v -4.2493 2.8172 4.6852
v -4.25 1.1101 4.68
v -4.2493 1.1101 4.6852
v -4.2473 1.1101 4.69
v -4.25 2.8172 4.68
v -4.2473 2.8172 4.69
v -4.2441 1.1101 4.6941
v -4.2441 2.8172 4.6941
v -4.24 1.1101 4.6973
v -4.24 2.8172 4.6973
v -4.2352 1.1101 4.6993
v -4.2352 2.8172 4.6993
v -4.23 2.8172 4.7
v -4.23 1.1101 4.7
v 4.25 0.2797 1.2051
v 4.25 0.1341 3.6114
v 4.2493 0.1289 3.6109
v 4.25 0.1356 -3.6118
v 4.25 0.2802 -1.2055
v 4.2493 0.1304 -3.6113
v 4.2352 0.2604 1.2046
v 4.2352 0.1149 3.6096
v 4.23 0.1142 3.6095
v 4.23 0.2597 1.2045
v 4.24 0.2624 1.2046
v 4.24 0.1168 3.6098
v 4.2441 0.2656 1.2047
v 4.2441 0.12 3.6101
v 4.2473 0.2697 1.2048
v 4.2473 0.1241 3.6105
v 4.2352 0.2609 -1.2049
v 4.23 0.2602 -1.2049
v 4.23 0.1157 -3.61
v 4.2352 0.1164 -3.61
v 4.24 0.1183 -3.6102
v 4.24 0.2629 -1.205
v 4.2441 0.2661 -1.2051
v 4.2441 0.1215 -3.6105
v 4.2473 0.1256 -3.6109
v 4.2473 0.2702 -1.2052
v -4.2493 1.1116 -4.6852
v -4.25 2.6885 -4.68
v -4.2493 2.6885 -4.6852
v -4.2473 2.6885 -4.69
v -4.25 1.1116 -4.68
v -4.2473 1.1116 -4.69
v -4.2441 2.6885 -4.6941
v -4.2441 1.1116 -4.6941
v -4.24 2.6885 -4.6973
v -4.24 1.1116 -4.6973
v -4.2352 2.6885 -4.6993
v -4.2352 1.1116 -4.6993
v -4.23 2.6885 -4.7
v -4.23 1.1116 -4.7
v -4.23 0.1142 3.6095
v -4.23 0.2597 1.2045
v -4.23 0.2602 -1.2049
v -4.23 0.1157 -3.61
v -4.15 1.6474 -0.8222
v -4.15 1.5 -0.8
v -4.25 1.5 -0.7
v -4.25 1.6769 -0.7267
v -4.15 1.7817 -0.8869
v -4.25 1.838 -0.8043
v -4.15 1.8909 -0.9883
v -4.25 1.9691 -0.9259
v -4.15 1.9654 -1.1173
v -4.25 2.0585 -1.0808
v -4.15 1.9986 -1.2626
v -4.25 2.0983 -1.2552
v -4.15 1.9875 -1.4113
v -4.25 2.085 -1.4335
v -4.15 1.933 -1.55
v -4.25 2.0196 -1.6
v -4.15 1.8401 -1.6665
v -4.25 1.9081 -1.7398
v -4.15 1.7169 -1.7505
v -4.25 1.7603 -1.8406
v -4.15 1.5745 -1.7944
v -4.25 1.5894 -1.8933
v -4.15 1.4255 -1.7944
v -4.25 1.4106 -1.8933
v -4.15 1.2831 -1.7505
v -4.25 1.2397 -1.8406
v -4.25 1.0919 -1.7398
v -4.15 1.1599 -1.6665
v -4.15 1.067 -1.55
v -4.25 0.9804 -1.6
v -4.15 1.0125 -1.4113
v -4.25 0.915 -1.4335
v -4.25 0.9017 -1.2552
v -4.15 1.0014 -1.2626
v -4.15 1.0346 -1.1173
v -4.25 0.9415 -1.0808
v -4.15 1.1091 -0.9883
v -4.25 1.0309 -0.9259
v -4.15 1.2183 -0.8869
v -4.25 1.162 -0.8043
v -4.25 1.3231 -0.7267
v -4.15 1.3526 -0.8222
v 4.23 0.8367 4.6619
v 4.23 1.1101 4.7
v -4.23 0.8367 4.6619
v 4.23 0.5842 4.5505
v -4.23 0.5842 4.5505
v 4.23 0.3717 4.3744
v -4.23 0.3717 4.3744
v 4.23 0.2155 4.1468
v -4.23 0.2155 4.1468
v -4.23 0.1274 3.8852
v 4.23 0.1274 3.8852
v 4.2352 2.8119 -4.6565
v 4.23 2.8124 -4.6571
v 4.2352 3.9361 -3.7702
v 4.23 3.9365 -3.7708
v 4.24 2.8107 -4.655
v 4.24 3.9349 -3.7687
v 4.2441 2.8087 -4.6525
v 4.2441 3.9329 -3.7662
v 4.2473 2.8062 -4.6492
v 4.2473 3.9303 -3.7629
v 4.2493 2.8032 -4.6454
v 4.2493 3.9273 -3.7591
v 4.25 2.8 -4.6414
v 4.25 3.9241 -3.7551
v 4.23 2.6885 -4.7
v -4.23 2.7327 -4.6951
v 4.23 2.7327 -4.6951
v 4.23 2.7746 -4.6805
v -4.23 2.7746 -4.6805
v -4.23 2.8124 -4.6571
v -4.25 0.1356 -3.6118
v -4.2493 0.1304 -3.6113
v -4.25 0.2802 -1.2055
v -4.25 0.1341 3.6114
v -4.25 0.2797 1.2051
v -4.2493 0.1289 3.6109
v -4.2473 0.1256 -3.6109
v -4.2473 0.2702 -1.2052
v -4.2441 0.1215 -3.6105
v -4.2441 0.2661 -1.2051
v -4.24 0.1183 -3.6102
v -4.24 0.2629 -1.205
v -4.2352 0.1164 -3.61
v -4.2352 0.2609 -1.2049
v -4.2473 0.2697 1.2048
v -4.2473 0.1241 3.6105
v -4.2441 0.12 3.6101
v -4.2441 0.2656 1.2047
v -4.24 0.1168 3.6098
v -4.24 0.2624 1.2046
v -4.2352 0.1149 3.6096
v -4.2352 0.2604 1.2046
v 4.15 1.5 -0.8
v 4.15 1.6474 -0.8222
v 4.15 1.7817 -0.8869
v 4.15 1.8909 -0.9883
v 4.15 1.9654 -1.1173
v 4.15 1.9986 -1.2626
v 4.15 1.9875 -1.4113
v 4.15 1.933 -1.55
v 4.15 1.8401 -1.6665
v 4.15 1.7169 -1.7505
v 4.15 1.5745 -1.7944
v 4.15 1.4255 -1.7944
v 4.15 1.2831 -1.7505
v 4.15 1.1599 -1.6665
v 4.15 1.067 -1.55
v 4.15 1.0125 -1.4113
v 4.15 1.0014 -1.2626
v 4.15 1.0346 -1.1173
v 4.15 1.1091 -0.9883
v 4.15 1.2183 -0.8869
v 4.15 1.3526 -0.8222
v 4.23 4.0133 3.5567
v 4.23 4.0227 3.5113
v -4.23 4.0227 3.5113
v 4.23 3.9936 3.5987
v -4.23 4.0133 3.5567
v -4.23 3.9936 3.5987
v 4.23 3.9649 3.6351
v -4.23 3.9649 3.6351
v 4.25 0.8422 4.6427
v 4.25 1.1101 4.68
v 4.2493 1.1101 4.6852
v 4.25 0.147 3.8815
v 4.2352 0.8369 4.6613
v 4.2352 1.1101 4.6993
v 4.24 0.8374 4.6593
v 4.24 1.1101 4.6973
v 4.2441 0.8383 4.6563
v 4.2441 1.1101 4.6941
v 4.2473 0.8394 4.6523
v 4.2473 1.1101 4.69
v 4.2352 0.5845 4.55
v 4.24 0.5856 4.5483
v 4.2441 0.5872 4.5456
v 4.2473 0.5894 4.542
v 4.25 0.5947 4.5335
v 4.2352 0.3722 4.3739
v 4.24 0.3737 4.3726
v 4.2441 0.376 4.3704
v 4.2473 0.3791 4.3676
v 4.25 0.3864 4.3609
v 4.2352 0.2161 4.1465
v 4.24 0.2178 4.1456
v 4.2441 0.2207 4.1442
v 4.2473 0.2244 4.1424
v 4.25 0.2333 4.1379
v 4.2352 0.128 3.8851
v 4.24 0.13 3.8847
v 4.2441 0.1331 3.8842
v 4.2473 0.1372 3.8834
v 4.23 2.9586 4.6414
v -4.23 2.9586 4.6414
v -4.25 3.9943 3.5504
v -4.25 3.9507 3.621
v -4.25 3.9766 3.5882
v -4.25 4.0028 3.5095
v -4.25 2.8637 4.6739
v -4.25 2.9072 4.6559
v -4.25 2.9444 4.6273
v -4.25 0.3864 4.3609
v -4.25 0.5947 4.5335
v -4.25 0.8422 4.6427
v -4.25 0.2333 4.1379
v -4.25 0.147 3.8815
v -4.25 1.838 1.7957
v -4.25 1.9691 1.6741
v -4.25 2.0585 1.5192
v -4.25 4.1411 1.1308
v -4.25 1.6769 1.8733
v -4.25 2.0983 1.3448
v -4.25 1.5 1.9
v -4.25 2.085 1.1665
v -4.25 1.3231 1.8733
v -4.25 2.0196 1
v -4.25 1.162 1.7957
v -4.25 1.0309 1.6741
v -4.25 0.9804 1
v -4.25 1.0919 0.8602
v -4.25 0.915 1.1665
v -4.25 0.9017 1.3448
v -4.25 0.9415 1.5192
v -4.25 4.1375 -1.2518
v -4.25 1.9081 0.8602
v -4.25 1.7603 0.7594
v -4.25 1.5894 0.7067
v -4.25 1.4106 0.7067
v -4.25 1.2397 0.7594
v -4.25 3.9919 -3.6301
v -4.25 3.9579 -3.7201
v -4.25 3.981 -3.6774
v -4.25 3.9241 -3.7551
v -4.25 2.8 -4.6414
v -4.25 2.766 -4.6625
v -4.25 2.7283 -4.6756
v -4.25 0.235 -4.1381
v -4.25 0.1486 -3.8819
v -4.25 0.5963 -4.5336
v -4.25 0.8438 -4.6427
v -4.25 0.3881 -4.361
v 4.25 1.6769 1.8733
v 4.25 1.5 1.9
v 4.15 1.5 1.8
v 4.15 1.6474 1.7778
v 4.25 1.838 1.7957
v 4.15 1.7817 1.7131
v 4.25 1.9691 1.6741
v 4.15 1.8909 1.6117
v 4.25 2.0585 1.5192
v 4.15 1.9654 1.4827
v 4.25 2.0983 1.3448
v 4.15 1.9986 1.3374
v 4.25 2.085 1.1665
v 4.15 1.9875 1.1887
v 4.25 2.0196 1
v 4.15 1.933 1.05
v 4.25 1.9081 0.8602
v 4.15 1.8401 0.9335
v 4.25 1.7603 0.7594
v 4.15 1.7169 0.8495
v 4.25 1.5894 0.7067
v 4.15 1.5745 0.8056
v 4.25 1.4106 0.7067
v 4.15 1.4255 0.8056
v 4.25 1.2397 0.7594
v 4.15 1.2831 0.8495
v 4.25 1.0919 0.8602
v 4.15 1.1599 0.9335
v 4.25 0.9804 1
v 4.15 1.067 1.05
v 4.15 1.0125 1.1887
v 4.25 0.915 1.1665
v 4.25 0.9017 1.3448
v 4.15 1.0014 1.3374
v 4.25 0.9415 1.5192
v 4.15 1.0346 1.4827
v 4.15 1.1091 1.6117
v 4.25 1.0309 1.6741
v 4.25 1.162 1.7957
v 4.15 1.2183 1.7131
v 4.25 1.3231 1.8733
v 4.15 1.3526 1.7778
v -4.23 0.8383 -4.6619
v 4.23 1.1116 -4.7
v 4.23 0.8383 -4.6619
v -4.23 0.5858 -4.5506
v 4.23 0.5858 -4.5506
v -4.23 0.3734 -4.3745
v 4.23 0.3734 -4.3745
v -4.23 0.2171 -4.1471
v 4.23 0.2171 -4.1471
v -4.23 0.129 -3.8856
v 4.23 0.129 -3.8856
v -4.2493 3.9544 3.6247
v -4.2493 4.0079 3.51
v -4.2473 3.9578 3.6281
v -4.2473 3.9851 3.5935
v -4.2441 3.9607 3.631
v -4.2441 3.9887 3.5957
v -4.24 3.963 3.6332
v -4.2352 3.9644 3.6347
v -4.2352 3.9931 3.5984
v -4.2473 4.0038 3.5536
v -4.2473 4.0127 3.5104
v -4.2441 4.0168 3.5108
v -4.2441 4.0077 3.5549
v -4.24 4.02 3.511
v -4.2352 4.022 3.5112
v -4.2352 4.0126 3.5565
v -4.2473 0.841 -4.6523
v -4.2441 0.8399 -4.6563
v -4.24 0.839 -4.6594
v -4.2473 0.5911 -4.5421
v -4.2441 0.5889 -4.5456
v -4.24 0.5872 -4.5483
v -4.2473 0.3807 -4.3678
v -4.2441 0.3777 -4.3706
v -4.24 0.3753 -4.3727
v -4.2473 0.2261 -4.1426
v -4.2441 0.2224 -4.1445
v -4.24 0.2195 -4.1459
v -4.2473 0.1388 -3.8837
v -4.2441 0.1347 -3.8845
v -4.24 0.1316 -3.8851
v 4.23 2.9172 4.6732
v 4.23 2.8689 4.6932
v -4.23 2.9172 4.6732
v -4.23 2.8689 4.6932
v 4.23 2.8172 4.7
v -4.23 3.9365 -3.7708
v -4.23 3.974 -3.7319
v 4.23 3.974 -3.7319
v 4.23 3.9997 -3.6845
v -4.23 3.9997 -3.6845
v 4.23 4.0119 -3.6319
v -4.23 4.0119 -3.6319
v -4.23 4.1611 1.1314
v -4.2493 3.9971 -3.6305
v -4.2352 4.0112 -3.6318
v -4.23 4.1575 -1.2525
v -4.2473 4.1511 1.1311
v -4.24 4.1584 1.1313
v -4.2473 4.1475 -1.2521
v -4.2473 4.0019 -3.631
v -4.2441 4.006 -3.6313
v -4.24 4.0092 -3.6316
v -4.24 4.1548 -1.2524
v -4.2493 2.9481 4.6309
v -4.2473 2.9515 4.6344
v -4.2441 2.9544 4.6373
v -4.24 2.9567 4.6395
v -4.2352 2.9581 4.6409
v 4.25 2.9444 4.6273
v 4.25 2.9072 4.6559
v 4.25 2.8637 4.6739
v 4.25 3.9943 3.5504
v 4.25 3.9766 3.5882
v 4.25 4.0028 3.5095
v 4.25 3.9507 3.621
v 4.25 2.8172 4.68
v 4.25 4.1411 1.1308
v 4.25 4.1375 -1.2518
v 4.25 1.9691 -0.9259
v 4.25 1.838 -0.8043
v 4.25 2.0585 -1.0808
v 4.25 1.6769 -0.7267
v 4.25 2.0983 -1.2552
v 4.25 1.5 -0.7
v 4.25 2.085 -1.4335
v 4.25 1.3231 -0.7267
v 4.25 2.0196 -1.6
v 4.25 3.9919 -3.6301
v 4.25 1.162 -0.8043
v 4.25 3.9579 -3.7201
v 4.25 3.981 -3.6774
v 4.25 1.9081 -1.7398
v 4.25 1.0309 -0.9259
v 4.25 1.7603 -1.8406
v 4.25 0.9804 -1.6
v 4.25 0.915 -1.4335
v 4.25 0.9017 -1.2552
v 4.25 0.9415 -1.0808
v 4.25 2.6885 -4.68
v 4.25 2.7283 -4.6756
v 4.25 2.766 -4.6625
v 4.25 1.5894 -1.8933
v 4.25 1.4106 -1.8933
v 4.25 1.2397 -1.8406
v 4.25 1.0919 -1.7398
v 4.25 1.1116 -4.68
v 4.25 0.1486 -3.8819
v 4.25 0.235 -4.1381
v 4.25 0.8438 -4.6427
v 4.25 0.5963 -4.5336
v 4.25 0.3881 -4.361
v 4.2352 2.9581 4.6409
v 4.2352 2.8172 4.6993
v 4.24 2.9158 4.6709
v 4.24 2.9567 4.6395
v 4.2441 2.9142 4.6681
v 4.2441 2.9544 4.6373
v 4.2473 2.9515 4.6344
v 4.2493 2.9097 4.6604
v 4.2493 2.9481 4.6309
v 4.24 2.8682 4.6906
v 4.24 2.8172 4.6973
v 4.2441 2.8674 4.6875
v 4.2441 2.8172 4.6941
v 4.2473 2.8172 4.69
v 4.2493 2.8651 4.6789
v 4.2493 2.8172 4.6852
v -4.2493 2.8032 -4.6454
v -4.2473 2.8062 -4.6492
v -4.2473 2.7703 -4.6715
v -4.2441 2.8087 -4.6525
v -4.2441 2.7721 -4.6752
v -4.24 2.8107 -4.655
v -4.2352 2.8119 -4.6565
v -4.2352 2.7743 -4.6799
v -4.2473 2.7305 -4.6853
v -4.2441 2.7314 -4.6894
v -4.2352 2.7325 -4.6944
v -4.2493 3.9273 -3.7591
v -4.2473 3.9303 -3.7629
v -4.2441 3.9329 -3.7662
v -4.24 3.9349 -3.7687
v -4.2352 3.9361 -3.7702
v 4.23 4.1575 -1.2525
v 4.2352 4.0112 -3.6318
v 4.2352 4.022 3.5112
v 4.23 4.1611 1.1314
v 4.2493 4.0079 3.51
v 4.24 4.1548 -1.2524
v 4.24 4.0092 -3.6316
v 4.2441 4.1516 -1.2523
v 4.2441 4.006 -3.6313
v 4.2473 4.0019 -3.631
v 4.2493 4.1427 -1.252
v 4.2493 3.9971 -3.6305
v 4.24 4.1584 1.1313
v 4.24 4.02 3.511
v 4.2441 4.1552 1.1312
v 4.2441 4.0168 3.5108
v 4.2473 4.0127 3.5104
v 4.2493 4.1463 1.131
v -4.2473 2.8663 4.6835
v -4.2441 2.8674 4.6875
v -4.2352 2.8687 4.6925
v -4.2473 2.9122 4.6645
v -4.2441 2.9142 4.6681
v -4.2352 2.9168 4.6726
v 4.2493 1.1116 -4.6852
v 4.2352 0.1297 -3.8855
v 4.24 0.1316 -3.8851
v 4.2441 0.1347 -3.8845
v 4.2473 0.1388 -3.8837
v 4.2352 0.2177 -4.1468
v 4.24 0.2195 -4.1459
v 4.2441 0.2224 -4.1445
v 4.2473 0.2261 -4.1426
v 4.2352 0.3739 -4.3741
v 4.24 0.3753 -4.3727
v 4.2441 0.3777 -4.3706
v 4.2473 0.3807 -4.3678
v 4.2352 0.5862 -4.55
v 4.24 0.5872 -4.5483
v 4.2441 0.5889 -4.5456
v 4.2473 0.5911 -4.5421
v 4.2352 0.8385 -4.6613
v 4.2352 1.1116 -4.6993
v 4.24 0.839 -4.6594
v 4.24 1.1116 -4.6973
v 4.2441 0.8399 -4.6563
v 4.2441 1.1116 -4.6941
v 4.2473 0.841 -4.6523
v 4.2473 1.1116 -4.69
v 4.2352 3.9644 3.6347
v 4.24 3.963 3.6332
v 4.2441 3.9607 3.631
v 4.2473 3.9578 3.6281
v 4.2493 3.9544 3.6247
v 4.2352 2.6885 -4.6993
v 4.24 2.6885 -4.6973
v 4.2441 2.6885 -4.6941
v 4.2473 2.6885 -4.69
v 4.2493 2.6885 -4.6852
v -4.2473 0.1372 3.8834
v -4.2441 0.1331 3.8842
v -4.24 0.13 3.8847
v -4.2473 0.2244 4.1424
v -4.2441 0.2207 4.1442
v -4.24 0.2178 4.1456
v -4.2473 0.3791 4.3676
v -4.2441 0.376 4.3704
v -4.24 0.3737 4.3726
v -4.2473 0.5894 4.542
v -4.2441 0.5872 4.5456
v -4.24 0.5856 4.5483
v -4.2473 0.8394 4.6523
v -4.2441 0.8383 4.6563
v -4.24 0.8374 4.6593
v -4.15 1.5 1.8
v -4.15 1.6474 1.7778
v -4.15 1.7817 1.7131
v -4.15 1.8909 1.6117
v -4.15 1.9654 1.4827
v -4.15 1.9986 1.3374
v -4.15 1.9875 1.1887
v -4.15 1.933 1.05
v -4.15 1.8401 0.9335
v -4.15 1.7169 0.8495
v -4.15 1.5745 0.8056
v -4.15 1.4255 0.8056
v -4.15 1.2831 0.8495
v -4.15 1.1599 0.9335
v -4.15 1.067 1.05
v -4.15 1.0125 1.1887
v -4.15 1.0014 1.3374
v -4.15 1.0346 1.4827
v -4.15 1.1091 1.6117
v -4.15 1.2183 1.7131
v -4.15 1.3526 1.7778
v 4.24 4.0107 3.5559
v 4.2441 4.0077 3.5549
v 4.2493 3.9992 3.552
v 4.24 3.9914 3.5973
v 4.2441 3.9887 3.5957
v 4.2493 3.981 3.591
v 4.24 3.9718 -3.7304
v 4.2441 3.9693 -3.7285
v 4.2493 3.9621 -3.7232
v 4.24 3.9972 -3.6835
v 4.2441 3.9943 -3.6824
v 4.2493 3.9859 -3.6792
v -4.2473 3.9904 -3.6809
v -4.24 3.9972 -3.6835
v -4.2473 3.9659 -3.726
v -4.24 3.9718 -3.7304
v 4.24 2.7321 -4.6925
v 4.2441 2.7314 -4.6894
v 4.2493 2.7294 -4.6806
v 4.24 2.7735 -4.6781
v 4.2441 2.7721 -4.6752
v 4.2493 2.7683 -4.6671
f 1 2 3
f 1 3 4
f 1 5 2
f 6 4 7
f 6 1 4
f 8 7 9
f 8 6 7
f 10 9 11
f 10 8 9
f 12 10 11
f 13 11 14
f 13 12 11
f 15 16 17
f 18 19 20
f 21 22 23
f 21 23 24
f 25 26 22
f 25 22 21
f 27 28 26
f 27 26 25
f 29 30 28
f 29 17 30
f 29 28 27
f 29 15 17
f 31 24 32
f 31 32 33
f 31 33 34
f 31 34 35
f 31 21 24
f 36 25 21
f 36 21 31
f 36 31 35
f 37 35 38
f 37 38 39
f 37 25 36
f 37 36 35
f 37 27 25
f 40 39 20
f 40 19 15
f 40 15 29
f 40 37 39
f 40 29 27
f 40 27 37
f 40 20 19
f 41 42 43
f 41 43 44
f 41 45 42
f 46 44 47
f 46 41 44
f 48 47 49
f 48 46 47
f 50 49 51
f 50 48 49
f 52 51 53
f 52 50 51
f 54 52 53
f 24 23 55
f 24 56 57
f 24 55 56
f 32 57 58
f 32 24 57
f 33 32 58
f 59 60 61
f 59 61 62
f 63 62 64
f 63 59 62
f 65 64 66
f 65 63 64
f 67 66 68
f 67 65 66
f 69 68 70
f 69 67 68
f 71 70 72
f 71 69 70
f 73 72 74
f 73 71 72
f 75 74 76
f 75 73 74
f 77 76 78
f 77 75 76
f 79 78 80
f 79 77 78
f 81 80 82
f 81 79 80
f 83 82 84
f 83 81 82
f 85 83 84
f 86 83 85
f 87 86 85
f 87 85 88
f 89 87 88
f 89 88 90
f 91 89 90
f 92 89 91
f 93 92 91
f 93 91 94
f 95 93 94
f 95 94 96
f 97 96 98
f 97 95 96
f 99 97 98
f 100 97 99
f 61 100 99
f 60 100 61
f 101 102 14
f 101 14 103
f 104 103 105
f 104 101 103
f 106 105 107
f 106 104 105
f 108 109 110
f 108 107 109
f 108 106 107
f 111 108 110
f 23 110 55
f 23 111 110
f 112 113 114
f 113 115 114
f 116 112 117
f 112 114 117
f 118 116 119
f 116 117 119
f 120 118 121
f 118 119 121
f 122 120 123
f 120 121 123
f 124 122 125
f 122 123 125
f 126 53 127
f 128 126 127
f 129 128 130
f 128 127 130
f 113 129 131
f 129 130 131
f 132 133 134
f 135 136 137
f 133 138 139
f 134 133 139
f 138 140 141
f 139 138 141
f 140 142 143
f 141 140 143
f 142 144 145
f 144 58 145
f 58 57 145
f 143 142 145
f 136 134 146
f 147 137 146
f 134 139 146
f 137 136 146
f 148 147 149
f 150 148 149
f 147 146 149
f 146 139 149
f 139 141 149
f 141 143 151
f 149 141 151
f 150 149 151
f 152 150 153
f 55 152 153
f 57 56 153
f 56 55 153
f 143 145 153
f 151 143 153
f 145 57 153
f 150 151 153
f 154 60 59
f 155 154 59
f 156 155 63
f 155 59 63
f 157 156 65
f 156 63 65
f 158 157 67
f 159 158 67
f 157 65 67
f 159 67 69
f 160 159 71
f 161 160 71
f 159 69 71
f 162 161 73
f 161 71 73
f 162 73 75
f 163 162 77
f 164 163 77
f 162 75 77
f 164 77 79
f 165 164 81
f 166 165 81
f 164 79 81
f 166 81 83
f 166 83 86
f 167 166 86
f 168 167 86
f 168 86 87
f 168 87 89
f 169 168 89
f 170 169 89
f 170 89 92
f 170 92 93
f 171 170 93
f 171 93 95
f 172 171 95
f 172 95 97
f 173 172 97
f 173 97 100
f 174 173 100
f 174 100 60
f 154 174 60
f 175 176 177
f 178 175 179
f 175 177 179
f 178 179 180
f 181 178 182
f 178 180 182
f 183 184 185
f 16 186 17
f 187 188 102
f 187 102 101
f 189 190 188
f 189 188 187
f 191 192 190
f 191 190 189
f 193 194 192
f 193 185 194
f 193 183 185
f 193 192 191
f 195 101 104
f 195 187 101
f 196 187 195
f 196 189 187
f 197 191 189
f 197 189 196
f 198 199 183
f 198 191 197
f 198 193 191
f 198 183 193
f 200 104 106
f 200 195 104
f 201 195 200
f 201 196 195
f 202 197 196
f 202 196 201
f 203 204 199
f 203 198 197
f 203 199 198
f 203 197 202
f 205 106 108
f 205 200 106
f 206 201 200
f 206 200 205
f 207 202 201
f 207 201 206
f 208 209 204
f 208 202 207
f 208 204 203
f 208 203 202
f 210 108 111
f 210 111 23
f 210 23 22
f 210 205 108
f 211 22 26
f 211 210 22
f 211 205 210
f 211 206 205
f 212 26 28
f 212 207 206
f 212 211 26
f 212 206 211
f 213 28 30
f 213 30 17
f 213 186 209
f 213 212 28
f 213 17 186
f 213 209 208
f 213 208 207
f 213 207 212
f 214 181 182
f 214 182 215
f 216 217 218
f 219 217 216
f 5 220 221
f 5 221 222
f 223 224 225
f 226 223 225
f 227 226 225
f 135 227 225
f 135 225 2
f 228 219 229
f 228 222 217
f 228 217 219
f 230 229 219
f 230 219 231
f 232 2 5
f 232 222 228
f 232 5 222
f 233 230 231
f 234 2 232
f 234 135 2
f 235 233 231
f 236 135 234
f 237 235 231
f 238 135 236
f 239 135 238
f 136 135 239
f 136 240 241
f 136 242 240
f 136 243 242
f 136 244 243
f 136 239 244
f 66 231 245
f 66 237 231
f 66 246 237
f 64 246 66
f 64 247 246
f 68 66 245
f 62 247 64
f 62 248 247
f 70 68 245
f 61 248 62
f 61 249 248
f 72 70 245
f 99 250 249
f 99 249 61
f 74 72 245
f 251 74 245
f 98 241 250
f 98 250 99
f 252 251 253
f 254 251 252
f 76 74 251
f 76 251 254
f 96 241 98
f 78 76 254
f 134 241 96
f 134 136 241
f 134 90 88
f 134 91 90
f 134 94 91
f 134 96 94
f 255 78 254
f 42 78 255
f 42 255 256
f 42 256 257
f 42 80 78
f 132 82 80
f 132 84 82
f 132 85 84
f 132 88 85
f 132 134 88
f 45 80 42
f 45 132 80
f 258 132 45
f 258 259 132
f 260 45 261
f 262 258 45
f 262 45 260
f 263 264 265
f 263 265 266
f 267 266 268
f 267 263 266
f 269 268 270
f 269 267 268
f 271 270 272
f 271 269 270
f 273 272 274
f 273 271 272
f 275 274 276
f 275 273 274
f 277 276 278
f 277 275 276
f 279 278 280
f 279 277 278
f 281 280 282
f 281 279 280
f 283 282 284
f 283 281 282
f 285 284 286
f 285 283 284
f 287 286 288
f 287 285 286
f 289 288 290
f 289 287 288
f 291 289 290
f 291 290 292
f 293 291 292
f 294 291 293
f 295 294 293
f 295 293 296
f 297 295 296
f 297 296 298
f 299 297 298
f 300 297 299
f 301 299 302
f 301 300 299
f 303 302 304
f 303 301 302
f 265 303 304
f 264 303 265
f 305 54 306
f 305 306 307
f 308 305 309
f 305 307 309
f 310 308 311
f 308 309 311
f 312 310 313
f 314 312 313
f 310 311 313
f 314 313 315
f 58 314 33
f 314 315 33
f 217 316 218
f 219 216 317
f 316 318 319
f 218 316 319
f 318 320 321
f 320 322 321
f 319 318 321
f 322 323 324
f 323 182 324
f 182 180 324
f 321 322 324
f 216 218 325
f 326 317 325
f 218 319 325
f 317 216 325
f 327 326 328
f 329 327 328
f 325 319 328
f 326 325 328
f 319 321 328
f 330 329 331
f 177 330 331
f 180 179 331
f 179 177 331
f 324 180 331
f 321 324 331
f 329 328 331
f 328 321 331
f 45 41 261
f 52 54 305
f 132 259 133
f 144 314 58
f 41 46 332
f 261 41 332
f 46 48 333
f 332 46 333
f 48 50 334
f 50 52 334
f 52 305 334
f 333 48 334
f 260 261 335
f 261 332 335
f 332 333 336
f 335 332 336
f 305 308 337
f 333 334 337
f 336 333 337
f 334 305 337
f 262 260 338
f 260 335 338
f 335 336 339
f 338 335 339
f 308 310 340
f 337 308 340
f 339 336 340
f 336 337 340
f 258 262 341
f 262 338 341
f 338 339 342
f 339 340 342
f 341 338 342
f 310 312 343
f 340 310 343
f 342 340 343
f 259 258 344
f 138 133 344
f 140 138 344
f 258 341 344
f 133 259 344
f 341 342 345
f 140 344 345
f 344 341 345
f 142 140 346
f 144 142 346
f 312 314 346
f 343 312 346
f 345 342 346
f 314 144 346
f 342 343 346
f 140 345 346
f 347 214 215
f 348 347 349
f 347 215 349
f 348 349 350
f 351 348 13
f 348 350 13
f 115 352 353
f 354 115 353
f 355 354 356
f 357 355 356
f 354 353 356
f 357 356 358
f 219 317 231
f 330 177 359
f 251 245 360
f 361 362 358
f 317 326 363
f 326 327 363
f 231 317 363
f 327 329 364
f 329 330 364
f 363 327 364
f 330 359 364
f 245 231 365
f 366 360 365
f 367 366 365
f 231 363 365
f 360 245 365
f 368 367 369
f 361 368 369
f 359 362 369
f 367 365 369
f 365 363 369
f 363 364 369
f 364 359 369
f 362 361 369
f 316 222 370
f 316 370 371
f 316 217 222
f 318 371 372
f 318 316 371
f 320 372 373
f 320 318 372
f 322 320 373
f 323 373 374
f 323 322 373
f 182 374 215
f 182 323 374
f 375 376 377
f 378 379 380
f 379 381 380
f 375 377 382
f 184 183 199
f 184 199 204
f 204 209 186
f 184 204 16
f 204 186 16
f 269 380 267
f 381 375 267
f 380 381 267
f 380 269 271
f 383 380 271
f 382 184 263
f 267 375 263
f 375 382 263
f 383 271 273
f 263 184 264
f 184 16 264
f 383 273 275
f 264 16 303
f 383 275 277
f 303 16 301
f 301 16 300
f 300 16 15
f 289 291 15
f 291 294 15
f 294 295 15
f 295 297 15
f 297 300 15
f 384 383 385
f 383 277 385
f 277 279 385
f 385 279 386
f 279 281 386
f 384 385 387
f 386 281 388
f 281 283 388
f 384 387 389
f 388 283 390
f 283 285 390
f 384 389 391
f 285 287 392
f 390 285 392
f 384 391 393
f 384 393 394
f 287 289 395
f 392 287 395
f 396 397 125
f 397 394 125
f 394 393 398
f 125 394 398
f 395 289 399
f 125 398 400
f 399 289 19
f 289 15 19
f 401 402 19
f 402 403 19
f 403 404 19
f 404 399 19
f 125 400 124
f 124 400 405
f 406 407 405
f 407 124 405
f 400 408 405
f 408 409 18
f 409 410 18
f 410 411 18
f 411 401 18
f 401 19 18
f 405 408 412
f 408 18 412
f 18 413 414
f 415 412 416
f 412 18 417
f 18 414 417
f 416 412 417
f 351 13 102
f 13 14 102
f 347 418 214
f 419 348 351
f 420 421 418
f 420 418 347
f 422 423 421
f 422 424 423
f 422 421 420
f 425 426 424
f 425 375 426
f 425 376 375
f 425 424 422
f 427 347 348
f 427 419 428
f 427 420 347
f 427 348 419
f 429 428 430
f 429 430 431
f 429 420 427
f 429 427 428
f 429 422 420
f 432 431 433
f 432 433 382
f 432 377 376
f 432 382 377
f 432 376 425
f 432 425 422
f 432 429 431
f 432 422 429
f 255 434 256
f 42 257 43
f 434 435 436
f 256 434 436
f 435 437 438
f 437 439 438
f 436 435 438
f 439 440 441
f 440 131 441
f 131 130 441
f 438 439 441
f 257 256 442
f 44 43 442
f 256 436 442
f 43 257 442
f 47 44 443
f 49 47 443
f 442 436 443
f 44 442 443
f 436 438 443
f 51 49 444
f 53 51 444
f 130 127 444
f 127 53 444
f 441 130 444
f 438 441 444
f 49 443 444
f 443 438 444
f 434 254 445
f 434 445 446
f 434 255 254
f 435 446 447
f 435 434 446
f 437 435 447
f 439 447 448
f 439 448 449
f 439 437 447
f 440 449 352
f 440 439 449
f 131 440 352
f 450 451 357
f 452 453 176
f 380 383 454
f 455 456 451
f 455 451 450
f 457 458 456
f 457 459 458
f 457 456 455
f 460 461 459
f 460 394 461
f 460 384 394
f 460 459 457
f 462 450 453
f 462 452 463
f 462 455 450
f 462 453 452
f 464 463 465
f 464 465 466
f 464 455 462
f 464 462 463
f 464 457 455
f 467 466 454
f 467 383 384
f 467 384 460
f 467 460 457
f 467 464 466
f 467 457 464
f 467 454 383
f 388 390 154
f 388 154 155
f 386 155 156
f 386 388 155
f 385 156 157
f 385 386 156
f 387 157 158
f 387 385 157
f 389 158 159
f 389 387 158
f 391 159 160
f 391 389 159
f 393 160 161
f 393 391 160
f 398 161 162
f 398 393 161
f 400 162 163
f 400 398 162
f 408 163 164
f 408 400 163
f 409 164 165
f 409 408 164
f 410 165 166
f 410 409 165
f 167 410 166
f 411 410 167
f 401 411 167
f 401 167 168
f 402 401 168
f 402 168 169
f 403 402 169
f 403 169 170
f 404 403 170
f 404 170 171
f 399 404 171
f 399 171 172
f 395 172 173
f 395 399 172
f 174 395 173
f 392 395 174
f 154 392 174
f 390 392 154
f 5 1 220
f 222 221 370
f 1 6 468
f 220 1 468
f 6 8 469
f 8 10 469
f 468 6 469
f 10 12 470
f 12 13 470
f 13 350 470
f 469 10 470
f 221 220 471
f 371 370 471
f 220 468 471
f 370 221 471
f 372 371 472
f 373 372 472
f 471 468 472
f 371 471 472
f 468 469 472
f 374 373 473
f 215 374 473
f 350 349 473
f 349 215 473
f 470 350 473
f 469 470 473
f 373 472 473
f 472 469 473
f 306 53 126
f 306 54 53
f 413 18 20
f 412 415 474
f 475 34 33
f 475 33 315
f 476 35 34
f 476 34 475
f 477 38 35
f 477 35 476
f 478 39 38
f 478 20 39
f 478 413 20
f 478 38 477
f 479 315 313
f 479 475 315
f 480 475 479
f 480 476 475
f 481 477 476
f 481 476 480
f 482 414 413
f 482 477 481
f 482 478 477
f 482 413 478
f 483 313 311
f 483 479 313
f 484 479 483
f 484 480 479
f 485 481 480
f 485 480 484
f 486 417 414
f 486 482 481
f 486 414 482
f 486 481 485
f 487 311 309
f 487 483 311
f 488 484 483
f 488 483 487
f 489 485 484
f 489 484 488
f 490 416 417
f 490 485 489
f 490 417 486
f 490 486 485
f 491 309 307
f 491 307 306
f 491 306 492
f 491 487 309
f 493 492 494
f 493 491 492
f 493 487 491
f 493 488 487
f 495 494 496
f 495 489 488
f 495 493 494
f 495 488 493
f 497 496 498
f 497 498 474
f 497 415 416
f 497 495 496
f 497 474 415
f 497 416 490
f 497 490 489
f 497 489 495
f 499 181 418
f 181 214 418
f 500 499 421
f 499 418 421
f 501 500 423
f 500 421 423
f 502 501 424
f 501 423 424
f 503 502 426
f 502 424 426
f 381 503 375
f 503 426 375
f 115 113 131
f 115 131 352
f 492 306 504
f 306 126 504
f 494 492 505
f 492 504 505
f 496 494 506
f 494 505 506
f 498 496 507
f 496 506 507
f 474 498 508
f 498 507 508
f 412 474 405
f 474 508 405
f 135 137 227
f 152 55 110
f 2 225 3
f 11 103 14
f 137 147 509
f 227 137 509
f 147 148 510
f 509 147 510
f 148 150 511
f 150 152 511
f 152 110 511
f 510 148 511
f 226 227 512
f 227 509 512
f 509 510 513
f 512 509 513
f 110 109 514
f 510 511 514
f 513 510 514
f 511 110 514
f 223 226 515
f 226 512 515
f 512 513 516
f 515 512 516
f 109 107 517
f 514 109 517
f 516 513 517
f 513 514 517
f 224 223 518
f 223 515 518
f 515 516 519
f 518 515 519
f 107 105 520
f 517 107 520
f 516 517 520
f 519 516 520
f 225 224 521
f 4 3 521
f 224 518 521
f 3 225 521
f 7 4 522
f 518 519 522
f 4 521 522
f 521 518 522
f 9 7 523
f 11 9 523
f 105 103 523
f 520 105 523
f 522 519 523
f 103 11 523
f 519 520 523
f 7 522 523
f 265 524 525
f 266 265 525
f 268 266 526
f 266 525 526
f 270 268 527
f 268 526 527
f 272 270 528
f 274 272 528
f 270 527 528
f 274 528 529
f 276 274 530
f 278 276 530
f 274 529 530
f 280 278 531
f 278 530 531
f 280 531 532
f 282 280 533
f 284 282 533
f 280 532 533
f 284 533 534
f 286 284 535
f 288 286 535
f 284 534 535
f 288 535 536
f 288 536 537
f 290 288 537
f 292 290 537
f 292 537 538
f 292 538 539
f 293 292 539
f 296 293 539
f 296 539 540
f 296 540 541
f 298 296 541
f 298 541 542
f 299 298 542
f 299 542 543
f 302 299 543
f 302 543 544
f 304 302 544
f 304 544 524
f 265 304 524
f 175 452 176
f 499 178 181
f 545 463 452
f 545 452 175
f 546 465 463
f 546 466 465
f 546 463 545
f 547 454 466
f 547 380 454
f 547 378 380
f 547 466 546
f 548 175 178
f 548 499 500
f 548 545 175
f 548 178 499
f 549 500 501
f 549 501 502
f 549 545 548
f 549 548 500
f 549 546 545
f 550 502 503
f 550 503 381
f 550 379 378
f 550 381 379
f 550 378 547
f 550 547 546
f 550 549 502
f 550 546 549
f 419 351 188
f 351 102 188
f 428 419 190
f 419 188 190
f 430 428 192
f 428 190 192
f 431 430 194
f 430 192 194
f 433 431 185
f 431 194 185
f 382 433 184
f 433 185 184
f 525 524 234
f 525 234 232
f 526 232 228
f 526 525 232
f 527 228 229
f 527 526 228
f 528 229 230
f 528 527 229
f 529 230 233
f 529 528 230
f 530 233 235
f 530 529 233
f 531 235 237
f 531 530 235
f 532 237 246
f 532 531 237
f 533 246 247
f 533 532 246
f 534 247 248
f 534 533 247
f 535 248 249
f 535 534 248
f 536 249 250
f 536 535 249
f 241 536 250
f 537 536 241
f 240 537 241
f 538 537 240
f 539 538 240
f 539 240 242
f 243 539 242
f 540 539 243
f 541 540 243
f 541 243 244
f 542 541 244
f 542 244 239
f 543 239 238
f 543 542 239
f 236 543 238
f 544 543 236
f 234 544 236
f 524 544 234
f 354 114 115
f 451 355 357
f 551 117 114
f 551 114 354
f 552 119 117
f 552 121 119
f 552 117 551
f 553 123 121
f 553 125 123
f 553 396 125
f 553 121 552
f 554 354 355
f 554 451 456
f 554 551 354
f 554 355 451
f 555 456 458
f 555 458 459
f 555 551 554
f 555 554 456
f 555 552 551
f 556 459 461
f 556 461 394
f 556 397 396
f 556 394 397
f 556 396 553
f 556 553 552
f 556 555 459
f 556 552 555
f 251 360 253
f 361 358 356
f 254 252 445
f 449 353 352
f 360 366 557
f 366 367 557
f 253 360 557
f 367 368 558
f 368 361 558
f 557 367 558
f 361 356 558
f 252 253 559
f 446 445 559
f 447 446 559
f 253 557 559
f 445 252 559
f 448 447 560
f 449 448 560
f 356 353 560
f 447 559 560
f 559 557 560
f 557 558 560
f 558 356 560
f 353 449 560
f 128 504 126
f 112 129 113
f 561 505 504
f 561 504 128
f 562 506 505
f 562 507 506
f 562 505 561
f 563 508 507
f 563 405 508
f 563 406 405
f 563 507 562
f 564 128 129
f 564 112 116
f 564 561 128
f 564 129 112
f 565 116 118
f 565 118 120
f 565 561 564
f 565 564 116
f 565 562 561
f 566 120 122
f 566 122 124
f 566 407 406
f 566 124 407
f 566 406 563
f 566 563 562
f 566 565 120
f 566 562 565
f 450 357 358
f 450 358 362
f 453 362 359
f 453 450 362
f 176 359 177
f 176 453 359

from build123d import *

# Parameters (mm, degrees)
SKETCH1_W           = 8.5
SKETCH1_H           = 9.4
BOSS_EXTRUDE1_DEPTH = 4.2
CUT_EXTRUDE1_DEPTH  = 14.2
CHAMFER1_SIZE       = 1.142109378
CHAMFER1_SIZE_2     = 1
FILLET1_R           = 1
FILLET2_R           = 0.2
FILLET3_R           = 0.02
SKETCH3_R           = 0.5
CUT_EXTRUDE2_DEPTH  = 14.2
CHAMFER2_SIZE       = 0.1


with BuildPart() as part:
    # Sketch1 → Boss-Extrude1 (new body)
    with BuildSketch(Plane(origin=(0, 0, 0), x_dir=(1, 0, 0), z_dir=(0, 1, 0))):
        Rectangle(SKETCH1_W, SKETCH1_H)
    extrude(amount=BOSS_EXTRUDE1_DEPTH)

    # Sketch2 → Cut-Extrude1 (cut)
    with BuildSketch(Plane(origin=(4.25, 0, 0), x_dir=(0, 0, -1), z_dir=(1, 0, 0))):
        with BuildLine():
            Line((-4.7, 3.9), (-5.253535024, 5.241651662))
            Line((-5.253535024, 5.241651662), (3.889156526, 7.141243929))
            Line((3.889156526, 7.141243929), (5.679183493, 5.077233243))
            Line((5.679183493, 5.077233243), (4.7, 3.9))
            ThreePointArc((4.7, 3.9), (0, 4.177084699), (-4.7, 3.9))
        make_face()
        with BuildLine():
            Line((4.717394395, 0), (0, -2.904825783))
            Line((0, -2.904825783), (-4.70037365, 0))
            ThreePointArc((-4.70037365, 0), (0.008510373, 0.278136861), (4.717394395, 0))
        make_face()
    extrude(amount=-CUT_EXTRUDE1_DEPTH, mode=Mode.SUBTRACT)

    # Chamfer1
    # the kernel refuses this chamfer: 1.142109378, 1 mm, written as the material it takes off along each edge
    with BuildSketch(Plane(origin=(7.19581135, 3.9, -4.7), x_dir=(0, -1, 0), z_dir=(-1, 0, 0))) as chamfer1_piece_1:
        with BuildLine():
            Line((CHAMFER1_SIZE, 0), (-0.103952397, 0.982391987))
            ThreePointArc((-0.103952397, 0.982391987), (-0.056683865, 0.506732753), (0, 0))
            Line((0, 0), (CHAMFER1_SIZE, 0))
        make_face()
    extrude(amount=14.391622699, mode=Mode.SUBTRACT)
    with BuildSketch(Plane(origin=(7.145211131, 3.9, 4.7), x_dir=(0, 0.10355747110922714, -0.994623471559696), z_dir=(-1, 0, 0))) as chamfer1_piece_2:
        with BuildLine():
            Line((1.122251325, 0), (-CHAMFER1_SIZE_2 * 0.103557471109, CHAMFER1_SIZE_2 * 0.99462347156))
            Line((-CHAMFER1_SIZE_2 * 0.103557471109, CHAMFER1_SIZE_2 * 0.99462347156), (0, 0))
            ThreePointArc((0, 0), (0.578858696, -0.003932038), (1.122251325, 0))
        make_face()
    extrude(amount=14.290422262, mode=Mode.SUBTRACT)

    # Fillet1
    fillet1_edges = [part.edges().sort_by_distance(p)[0] for p in [
        (0, 0.002058181, -4.7),
        (0, 4.4293e-05, 4.7),
    ]]
    fillet(fillet1_edges, radius=FILLET1_R)

    # Fillet2
    fillet2_edges = [part.edges().sort_by_distance(p)[0] for p in [
        (0, 2.757890622, -4.7),
        (0, 4.016217509, 3.583782491),
        (0, 4.003952397, -3.717608013),
        (0, 2.9, 4.7),
    ]]
    fillet(fillet2_edges, radius=FILLET2_R)

    # Fillet3
    fillet3_edges = [part.edges().sort_by_distance(p)[0] for p in [
        (4.25, 0.278135992, -0.000173553),
        (4.25, 0.373361144, -4.374523412),
        (4.25, 0.371678264, 4.374369531),
        (-4.25, 0.278135992, -0.000173553),
        (-4.25, 0.373361144, -4.374523412),
        (-4.25, 0.371678264, 4.374369531),
        (4.25, 1.900073524, -4.7),
        (-4.25, 1.900073524, -4.7),
        (4.25, 1.963614788, 4.7),
        (4.25, 3.374434854, -4.21391807),
        (4.25, 4.177038875, -0.06054719),
        (4.25, 3.461723118, 4.138276882),
        (4.25, 2.893693974, 4.684775907),
        (4.25, 4.004681229, 3.578291648),
        (4.25, 3.988486823, -3.709084943),
        (4.25, 2.754062042, -4.688959975),
        (-4.25, 3.374434854, -4.21391807),
        (-4.25, 1.963614788, 4.7),
        (-4.25, 3.461723118, 4.138276882),
        (-4.25, 4.177038875, -0.06054719),
        (-4.25, 2.893693974, 4.684775907),
        (-4.25, 4.004681229, 3.578291648),
        (-4.25, 3.988486823, -3.709084943),
        (-4.25, 2.754062042, -4.688959975),
    ]]
    fillet(fillet3_edges, radius=FILLET3_R)

    # Sketch3 → Cut-Extrude2 (cut)
    with BuildSketch(Plane.ZY.offset(4.25)):
        with Locations((-1.3, 1.5)):
            Circle(SKETCH3_R)
        with Locations((1.3, 1.5)):
            Circle(SKETCH3_R)
    extrude(amount=-CUT_EXTRUDE2_DEPTH, mode=Mode.SUBTRACT)

    # Chamfer2
    chamfer2_edges = [part.edges().sort_by_distance(p)[0] for p in [
        (4.25, 1.5, -1.8),
        (-4.25, 1.5, -1.8),
        (4.25, 1.5, 0.8),
        (-4.25, 1.5, 0.8),
    ]]
    chamfer(chamfer2_edges, length=CHAMFER2_SIZE)


solid = part.part
